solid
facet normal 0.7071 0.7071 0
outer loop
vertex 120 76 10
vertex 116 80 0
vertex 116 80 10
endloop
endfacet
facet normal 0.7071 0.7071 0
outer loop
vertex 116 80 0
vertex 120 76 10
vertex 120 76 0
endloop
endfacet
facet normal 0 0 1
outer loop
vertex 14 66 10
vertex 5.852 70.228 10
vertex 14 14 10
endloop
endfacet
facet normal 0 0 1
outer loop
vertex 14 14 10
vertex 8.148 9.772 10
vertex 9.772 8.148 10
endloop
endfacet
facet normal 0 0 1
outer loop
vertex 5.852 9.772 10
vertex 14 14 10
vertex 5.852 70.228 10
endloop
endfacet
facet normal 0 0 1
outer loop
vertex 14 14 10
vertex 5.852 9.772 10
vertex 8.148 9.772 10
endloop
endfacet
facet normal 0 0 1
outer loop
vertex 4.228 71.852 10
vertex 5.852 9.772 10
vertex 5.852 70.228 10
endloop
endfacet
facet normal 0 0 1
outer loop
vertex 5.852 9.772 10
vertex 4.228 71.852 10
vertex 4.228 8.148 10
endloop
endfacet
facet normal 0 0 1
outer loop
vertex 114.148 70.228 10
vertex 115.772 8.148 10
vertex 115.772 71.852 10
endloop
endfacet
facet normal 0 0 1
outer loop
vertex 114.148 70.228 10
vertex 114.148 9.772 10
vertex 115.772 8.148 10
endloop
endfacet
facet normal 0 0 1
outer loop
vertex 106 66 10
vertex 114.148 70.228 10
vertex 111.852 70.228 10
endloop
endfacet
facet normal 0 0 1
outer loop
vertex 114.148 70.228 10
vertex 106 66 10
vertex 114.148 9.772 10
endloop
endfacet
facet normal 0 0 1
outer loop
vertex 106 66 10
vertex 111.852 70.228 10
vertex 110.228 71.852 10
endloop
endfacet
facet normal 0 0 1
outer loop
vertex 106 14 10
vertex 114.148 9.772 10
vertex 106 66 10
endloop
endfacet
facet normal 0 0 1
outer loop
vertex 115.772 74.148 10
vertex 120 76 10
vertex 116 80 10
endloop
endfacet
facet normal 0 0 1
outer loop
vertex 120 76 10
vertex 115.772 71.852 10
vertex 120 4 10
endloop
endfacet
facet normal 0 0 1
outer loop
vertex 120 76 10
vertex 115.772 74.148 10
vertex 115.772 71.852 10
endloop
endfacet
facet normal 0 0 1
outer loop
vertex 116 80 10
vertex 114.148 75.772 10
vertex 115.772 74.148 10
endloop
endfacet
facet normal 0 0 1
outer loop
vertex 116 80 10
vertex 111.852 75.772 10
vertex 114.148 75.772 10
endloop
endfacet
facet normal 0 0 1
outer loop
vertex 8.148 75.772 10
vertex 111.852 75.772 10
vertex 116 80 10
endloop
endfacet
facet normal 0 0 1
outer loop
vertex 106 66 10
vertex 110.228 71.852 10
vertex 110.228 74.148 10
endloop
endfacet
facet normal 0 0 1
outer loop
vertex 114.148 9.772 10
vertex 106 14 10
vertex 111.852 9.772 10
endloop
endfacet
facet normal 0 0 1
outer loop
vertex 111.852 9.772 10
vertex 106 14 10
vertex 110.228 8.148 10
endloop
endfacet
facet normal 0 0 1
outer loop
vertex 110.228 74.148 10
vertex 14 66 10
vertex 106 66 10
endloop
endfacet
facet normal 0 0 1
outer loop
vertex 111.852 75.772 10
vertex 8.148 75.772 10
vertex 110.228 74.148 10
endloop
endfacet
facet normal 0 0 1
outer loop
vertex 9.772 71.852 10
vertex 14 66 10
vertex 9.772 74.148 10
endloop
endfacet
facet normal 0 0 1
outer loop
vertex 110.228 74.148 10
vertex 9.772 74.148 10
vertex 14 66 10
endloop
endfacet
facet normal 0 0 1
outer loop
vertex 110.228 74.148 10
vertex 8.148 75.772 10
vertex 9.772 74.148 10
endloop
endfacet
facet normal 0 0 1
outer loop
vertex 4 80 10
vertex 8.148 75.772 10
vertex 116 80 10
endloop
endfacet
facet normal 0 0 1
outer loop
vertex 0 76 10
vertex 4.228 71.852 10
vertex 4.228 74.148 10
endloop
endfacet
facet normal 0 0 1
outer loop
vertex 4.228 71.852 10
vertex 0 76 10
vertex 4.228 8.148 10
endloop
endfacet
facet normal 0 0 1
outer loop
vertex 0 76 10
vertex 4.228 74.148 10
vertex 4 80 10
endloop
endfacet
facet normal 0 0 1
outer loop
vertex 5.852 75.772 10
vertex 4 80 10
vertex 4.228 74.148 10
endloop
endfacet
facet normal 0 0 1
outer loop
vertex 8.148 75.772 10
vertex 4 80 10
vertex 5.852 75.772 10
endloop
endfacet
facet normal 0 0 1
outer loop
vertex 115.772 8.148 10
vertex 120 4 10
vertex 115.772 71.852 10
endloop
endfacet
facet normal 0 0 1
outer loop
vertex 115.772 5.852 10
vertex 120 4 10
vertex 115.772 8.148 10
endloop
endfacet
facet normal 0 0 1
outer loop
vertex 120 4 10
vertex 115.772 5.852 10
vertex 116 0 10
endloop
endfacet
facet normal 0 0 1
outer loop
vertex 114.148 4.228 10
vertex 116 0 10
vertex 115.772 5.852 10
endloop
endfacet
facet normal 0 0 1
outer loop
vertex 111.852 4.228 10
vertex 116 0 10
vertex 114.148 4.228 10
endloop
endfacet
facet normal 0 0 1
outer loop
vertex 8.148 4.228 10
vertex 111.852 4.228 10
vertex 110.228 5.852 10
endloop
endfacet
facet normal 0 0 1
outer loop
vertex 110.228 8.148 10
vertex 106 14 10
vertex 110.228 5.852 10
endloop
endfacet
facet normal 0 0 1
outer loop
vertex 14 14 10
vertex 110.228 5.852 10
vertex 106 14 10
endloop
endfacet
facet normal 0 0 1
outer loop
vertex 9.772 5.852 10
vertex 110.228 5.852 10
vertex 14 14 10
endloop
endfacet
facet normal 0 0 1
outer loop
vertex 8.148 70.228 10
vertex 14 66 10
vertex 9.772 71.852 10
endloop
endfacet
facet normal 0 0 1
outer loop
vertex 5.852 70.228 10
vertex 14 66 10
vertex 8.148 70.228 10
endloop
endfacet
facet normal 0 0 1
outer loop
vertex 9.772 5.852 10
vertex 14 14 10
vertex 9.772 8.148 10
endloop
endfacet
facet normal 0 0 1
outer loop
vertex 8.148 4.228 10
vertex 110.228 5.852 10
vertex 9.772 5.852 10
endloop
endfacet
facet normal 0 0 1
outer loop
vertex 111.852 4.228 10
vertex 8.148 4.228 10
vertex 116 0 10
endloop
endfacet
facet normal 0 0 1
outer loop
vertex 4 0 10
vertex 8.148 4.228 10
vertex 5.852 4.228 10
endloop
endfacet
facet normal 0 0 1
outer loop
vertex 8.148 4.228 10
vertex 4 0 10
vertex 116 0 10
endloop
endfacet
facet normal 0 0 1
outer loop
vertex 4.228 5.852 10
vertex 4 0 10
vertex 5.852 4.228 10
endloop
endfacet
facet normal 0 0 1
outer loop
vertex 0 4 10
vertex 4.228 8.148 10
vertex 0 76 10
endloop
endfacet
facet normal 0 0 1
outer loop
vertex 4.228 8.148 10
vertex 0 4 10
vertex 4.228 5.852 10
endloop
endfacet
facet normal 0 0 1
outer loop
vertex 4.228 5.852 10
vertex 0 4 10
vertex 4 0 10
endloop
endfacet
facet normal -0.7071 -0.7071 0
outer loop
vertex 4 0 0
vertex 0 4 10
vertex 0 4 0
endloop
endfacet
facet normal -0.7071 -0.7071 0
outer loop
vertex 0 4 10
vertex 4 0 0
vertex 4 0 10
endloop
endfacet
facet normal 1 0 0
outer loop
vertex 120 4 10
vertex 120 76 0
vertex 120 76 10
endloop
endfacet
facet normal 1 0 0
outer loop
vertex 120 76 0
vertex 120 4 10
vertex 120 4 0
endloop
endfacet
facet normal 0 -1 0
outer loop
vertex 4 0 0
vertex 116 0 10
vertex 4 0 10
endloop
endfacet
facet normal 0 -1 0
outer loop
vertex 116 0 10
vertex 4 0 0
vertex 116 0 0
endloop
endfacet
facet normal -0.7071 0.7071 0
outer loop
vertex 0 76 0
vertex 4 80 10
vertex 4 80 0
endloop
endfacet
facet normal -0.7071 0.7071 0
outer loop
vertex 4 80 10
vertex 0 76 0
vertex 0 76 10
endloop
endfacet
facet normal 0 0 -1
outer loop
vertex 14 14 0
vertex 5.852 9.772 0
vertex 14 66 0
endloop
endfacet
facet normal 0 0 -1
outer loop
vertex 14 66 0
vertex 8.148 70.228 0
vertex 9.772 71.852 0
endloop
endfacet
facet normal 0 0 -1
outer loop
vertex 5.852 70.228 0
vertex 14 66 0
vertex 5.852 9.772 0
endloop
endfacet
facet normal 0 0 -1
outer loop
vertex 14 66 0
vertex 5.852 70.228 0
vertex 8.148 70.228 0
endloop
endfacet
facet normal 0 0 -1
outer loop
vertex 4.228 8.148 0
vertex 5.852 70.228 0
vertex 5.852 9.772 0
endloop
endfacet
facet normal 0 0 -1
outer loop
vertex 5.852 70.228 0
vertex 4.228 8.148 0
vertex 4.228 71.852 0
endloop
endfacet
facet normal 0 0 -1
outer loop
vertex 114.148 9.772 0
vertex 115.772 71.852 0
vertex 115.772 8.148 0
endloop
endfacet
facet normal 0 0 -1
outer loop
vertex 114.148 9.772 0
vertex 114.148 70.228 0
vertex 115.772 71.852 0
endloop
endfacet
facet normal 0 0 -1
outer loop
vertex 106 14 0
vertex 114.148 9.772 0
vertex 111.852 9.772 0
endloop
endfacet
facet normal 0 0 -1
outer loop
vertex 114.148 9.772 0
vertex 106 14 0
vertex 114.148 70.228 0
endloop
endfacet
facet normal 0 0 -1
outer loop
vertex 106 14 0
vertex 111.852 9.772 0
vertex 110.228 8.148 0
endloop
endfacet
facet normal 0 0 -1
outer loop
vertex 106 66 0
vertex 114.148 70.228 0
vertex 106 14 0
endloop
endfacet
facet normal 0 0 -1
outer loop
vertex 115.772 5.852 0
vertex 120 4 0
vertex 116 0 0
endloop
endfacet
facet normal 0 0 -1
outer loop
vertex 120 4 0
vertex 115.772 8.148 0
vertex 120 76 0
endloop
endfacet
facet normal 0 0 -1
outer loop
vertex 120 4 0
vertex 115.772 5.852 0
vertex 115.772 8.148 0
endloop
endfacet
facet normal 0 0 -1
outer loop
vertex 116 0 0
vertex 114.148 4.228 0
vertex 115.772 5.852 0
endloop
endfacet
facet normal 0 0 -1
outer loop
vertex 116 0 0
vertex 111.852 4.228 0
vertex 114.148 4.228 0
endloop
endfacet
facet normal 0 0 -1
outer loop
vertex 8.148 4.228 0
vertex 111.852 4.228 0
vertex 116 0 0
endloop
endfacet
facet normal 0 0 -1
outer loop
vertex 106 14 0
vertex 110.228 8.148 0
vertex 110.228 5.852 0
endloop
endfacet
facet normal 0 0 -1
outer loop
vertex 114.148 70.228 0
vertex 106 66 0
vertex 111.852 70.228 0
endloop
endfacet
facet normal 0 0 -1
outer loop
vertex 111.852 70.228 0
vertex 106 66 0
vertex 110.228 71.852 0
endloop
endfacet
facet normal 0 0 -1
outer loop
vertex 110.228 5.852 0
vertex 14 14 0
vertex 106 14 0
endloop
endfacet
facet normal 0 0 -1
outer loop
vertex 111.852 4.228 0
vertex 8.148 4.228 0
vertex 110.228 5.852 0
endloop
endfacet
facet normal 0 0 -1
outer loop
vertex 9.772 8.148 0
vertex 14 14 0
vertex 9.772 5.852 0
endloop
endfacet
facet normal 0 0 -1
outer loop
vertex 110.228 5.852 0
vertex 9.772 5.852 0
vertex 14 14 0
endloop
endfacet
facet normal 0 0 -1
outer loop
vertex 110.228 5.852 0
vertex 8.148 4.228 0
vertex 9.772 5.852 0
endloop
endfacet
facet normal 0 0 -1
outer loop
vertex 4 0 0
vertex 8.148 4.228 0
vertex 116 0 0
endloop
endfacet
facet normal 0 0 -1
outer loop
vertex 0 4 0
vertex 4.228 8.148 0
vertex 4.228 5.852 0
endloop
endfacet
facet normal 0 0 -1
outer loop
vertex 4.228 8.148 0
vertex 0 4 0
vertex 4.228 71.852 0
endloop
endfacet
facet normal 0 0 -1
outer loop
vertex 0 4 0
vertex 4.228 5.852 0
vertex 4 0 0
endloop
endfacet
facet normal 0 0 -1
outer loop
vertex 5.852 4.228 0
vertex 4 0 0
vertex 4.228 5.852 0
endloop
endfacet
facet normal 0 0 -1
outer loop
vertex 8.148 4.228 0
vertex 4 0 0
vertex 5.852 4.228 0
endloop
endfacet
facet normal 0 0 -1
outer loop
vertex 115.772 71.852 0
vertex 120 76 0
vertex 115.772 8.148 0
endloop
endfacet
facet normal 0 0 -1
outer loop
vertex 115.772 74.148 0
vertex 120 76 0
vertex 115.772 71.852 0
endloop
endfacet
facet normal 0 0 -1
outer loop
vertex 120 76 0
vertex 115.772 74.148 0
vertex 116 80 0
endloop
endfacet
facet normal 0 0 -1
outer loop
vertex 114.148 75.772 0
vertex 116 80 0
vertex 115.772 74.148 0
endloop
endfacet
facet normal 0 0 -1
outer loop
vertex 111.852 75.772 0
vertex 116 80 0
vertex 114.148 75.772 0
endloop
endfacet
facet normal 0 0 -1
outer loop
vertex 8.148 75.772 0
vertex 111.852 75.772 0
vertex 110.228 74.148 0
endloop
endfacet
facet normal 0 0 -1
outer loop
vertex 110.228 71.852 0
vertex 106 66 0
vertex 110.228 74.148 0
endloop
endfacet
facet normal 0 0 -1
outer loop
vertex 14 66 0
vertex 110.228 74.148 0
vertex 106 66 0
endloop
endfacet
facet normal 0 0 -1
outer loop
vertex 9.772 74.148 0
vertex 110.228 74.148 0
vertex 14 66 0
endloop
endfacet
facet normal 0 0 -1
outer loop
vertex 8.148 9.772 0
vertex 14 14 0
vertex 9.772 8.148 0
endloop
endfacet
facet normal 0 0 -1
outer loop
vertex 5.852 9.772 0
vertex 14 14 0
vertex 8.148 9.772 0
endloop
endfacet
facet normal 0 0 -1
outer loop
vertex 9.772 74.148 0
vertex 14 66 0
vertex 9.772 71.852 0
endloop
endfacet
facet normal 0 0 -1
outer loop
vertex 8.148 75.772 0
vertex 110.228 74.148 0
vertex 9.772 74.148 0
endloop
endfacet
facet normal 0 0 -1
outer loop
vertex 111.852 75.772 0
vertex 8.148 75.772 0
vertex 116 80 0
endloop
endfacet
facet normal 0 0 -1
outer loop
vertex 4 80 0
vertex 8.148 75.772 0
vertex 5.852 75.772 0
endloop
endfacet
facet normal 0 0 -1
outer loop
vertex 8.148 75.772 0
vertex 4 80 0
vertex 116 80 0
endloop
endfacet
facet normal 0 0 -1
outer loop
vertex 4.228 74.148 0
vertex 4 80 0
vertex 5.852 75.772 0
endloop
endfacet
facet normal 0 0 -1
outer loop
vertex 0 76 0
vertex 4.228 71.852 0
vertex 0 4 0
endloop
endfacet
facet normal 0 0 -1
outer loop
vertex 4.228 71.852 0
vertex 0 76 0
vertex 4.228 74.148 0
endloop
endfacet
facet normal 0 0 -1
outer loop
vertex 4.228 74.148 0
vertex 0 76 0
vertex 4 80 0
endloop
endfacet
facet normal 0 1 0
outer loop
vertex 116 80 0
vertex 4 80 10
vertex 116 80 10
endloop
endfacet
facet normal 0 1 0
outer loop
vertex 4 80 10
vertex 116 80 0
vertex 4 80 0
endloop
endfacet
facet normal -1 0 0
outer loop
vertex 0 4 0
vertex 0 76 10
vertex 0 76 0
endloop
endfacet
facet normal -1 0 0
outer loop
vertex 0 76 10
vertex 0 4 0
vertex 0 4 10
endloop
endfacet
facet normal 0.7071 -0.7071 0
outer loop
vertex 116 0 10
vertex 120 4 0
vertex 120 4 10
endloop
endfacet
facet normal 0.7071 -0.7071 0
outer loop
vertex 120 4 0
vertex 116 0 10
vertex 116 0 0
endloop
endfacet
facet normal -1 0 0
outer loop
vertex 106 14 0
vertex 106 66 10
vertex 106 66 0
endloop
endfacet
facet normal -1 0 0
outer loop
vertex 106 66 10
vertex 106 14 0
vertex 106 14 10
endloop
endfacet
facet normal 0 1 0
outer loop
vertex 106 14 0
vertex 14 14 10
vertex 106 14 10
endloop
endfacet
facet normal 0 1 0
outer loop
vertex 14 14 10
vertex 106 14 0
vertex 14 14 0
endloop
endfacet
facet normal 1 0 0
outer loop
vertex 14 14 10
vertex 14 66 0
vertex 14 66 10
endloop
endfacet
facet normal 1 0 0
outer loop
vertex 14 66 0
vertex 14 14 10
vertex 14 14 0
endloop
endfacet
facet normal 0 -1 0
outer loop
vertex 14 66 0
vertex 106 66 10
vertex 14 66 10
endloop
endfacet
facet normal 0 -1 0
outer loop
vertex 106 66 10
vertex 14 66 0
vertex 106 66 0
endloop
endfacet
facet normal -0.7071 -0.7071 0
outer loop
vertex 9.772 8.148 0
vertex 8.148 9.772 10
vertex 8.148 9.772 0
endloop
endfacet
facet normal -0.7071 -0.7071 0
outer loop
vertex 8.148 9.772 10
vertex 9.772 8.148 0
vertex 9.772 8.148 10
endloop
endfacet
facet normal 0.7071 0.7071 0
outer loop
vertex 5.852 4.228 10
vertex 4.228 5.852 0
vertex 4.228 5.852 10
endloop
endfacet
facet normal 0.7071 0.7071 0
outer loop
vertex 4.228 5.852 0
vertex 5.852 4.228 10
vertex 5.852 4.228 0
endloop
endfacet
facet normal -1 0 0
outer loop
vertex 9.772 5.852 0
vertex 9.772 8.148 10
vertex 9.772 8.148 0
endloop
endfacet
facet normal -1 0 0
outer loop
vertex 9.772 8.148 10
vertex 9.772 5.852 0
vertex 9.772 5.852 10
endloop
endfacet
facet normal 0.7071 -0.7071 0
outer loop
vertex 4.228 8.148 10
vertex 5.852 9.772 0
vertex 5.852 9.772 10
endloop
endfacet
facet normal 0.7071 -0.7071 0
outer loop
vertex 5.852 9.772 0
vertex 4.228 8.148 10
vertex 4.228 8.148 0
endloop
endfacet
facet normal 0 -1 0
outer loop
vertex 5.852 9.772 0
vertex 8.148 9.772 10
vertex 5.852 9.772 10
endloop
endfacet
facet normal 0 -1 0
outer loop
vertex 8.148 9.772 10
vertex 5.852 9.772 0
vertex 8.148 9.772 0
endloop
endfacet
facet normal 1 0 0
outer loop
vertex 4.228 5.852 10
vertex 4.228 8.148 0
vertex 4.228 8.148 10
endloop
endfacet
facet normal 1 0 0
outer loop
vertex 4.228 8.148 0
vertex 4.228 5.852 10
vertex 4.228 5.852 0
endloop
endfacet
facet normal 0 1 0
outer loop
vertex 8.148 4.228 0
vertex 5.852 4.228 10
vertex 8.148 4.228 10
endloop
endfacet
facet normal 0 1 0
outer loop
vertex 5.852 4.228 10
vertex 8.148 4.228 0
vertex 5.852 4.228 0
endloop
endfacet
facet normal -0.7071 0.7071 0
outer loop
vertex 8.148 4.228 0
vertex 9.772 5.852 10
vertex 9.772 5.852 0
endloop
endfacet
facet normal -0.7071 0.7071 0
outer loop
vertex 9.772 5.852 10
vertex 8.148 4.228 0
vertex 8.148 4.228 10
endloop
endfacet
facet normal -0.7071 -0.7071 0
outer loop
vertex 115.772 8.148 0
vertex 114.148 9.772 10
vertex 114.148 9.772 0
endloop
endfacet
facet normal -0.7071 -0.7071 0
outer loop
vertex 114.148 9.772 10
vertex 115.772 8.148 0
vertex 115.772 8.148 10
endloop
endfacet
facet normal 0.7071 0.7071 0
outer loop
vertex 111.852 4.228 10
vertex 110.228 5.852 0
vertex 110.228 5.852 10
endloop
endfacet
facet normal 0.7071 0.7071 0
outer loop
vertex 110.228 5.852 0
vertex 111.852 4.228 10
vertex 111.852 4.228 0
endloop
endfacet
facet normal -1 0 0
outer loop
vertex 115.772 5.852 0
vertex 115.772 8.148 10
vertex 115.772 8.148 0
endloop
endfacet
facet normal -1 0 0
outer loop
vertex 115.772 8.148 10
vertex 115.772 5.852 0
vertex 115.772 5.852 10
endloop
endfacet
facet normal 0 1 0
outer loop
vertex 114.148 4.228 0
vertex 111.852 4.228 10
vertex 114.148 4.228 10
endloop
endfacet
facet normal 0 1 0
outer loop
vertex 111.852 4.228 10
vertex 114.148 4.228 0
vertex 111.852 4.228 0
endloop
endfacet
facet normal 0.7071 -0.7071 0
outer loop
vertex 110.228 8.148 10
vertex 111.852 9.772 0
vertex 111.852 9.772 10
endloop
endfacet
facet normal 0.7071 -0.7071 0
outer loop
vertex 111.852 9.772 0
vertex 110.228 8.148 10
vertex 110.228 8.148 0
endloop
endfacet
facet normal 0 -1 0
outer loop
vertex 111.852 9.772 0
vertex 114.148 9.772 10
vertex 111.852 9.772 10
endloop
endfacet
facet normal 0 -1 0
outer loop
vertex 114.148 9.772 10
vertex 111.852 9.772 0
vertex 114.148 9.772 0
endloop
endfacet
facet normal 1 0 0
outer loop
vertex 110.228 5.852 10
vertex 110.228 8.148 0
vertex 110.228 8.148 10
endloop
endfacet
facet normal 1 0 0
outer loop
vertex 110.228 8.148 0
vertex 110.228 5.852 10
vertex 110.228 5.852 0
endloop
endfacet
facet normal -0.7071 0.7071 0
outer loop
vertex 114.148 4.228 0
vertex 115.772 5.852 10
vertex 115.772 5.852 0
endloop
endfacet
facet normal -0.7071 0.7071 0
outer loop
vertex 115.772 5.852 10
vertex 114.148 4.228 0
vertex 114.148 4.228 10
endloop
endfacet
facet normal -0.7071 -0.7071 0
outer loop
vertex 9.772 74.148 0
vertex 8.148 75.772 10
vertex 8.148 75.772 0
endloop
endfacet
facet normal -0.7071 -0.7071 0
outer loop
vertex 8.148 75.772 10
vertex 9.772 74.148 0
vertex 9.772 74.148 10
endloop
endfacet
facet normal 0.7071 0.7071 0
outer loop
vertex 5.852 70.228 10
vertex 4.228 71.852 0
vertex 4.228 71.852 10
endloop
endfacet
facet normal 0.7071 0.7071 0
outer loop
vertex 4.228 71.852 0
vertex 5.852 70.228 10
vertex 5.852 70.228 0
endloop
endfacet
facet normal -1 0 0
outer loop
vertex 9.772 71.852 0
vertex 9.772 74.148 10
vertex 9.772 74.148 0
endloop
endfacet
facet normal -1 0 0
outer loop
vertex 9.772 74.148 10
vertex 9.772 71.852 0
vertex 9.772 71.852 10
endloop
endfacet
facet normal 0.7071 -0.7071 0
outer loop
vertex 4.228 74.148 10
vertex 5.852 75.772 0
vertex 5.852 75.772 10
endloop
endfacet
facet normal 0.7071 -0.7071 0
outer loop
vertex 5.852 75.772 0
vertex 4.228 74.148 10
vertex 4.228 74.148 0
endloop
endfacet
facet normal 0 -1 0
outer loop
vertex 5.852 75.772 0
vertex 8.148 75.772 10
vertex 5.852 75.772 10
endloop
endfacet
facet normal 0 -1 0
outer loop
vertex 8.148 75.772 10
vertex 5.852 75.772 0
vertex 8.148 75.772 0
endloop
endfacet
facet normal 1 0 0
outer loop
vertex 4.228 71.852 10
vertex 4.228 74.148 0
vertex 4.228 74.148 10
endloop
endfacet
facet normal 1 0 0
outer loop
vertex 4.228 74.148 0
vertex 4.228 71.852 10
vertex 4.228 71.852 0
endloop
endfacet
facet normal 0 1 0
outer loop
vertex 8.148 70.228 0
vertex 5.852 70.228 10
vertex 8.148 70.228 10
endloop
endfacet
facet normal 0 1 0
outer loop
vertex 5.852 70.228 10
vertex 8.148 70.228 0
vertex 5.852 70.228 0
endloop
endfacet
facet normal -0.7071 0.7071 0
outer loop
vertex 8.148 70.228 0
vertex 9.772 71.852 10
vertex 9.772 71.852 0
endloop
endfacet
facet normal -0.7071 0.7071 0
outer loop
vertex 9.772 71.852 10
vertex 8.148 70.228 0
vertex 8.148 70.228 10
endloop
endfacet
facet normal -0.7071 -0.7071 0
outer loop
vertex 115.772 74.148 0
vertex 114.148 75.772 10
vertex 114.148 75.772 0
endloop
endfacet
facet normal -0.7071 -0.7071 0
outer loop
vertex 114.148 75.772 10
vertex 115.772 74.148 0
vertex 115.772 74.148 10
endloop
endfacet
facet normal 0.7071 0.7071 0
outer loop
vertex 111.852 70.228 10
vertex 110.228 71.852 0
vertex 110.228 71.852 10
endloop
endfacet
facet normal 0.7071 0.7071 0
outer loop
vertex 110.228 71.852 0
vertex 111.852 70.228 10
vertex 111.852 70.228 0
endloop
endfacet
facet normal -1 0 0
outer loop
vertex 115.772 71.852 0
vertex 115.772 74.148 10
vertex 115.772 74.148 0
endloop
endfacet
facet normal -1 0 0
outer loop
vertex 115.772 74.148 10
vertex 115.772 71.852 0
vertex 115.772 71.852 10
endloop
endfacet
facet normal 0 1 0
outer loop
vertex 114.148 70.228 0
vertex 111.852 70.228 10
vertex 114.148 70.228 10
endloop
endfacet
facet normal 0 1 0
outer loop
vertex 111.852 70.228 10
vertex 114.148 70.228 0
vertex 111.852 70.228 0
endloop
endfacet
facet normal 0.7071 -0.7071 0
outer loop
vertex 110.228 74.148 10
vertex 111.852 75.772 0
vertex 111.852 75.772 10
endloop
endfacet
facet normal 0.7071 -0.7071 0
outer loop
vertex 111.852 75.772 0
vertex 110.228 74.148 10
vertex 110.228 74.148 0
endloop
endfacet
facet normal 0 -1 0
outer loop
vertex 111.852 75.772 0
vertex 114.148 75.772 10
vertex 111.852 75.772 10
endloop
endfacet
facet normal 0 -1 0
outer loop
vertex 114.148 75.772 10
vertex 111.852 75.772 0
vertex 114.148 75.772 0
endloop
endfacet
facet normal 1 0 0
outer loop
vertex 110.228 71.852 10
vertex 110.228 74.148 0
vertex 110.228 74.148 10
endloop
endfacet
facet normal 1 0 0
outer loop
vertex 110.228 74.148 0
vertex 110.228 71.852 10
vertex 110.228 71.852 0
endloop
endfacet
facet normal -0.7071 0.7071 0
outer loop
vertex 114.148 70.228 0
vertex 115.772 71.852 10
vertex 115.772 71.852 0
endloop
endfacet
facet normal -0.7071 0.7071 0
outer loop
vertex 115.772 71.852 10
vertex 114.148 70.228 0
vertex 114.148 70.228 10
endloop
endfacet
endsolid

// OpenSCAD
$fn = 32;

// ----------------------------------------------------------------------
// Frame plate: 120 x 80 frame, 14 mm rails
// ----------------------------------------------------------------------

// --- parameters (mm) ---
plate_l = 120;            // plate length, X
plate_w = 80;             // plate width, Y
plate_t = 10;             // plate thickness, Z (extrusion height)
corner_c = 4;             // corner chamfer
frame_bar = 14;           // frame rail width
bolt_r = 3;               // corner bolt window radius
bolt_inset = 7;           // bolt centre inset from the edges
fit_tol = 0.02;           // declared fit tolerance (prompt contract)
free_tol = 0.2;           // declared free tolerance (prompt contract)

win_l = plate_l - 2 * frame_bar;  // window length
win_w = plate_w - 2 * frame_bar;  // window width
bolt_d = 2 * bolt_r;  // corner hole diameter

profile = [[4, 0], [116, 0], [120, 4], [120, 76], [116, 80], [4, 80], [0, 76], [0, 4]];  // primary outline, 8 points, counter clockwise
void_1 = [[14, 14], [106, 14], [106, 66], [14, 66]];  // the window, 4 points
void_2 = [[9.772, 8.148], [8.148, 9.772], [5.852, 9.772], [4.228, 8.148], [4.228, 5.852], [5.852, 4.228], [8.148, 4.228], [9.772, 5.852]];  // corner bolt window, 8 points
void_3 = [[115.772, 8.148], [114.148, 9.772], [111.852, 9.772], [110.228, 8.148], [110.228, 5.852], [111.852, 4.228], [114.148, 4.228], [115.772, 5.852]];  // corner bolt window, 8 points
void_4 = [[9.772, 74.148], [8.148, 75.772], [5.852, 75.772], [4.228, 74.148], [4.228, 71.852], [5.852, 70.228], [8.148, 70.228], [9.772, 71.852]];  // corner bolt window, 8 points
void_5 = [[115.772, 74.148], [114.148, 75.772], [111.852, 75.772], [110.228, 74.148], [110.228, 71.852], [111.852, 70.228], [114.148, 70.228], [115.772, 71.852]];  // corner bolt window, 8 points

// --- the one profile operation ---
difference() {
  linear_extrude(height = plate_t) polygon(points = profile);
  translate([0, 0, -1])
    linear_extrude(height = plate_t + 2) polygon(points = void_1);
  translate([0, 0, -1])
    linear_extrude(height = plate_t + 2) polygon(points = void_2);
  translate([0, 0, -1])
    linear_extrude(height = plate_t + 2) polygon(points = void_3);
  translate([0, 0, -1])
    linear_extrude(height = plate_t + 2) polygon(points = void_4);
  translate([0, 0, -1])
    linear_extrude(height = plate_t + 2) polygon(points = void_5);
}
